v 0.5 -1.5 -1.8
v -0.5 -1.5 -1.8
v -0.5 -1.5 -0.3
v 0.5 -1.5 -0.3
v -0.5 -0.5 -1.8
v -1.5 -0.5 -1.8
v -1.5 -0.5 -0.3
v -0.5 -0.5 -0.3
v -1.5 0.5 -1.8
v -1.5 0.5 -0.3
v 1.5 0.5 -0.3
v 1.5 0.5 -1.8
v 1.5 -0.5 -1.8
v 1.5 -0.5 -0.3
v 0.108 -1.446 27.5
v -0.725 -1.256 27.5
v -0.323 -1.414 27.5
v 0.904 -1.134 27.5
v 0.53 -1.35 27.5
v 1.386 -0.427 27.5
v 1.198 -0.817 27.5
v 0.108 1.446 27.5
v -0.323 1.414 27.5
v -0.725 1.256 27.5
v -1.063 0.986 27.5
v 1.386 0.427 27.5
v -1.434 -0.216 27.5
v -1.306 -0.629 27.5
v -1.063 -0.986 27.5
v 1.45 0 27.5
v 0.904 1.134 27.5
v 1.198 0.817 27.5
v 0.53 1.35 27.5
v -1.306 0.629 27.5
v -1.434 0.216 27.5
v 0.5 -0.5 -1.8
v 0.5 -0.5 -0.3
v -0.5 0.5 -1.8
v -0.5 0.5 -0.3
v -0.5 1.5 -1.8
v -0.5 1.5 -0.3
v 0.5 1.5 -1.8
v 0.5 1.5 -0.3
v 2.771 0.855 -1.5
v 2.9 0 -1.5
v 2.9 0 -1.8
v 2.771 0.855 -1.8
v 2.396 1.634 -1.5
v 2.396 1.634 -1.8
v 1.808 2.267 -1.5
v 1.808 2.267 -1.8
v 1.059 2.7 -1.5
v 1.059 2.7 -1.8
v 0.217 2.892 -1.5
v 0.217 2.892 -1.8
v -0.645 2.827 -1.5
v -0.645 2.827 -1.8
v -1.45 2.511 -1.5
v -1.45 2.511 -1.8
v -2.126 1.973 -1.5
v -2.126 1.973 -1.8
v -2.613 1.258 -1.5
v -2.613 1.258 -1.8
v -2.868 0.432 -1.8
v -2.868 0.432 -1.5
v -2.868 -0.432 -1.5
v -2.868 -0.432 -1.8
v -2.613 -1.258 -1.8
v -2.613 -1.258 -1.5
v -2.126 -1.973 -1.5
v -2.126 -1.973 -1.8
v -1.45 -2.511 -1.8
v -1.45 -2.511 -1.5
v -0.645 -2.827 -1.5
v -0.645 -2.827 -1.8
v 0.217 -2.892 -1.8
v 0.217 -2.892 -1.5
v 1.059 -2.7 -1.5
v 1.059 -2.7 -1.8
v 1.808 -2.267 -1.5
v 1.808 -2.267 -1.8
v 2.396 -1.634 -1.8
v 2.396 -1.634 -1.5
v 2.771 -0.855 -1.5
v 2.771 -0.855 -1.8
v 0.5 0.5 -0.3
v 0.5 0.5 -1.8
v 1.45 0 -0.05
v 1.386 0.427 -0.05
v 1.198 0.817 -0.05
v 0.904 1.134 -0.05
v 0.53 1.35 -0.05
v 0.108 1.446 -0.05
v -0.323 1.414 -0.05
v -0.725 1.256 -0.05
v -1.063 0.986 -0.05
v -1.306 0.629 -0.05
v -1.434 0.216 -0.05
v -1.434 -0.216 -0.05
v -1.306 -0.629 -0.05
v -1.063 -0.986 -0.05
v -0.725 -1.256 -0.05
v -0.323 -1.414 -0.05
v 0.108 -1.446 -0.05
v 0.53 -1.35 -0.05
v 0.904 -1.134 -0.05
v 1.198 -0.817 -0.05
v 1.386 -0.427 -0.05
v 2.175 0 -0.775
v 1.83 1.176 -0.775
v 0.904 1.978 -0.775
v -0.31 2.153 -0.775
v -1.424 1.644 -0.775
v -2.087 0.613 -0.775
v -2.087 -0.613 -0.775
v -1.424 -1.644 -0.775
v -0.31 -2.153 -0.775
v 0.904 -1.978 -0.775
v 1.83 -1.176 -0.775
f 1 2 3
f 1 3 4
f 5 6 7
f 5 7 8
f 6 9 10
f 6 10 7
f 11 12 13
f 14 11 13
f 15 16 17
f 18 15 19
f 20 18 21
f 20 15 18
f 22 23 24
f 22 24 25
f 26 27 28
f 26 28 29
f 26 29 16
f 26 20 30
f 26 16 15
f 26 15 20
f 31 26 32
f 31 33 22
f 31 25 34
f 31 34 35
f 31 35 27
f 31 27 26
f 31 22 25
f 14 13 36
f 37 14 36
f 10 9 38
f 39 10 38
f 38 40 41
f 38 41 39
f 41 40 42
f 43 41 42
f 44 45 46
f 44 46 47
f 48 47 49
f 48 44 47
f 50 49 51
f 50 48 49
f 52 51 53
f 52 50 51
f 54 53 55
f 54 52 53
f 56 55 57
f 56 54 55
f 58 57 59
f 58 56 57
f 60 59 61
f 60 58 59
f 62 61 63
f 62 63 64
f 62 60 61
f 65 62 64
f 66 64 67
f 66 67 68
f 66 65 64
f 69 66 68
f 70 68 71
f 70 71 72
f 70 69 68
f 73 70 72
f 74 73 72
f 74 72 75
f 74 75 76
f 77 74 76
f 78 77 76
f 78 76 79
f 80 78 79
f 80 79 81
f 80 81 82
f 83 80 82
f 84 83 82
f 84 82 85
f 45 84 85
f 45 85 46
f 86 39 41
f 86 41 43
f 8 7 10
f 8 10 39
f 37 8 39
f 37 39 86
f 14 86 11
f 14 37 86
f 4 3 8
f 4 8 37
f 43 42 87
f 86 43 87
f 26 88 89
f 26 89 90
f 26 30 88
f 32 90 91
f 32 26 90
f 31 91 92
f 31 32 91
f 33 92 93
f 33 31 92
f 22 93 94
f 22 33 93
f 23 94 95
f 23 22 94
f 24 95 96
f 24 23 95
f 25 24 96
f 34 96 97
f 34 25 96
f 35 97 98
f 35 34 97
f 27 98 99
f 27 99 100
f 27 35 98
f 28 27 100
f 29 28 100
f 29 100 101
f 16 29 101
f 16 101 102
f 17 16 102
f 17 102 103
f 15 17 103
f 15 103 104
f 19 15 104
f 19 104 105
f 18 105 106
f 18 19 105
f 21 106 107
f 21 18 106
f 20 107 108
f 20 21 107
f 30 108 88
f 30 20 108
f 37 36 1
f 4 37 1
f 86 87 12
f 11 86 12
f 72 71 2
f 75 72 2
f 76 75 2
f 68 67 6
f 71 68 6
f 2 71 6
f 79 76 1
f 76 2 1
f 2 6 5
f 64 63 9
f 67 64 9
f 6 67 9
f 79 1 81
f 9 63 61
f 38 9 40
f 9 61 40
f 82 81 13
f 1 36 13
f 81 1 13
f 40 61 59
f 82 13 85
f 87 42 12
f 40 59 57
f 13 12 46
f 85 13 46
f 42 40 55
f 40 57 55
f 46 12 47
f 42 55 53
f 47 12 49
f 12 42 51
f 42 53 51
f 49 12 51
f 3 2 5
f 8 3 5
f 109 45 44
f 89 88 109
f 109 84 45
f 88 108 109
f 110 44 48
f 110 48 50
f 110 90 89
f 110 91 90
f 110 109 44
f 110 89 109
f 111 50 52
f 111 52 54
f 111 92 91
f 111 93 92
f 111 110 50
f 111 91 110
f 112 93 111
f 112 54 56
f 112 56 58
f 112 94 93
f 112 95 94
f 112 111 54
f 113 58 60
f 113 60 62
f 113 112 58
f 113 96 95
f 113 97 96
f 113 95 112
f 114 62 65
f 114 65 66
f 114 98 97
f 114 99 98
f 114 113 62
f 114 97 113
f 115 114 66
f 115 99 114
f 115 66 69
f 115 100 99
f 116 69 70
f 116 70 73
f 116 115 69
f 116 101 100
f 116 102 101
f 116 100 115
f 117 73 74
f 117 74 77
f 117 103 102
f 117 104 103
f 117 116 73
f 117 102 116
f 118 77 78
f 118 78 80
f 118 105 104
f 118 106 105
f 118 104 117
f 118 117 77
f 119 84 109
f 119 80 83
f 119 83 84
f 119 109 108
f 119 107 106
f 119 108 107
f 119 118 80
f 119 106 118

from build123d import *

# Parameters (mm, degrees)
F0_R        = 1.45
F1_DEPTH    = 27.5
F2_R        = 2.9
F3_DEPTH    = 1.8
F4_W        = 1
F4_H        = 1
F5_DEPTH    = 1.5
F6_S5_R     = 1.45
F6_T6_DEPTH = 6


# Not quite as in the source:
# - a fillet or chamfer that OpenCascade refuses, or shapes differently, is made with other operations: its cross-section is extruded or revolved along the edge and cut away or added


with BuildPart() as f1:
    # F0 (on Top) → F1 (new body)
    with BuildSketch(Plane.XY):
        Circle(F0_R)
    extrude(amount=F1_DEPTH)

    # F2 (on Top) → F3 (join)
    with BuildSketch(Plane.XY):
        Circle(F2_R)
    extrude(amount=-F3_DEPTH)

    # F4 (on face) → F5 (cut)
    with BuildSketch(Plane(origin=(0, 0, -1.8), x_dir=(1, 0, 0), z_dir=(0, 0, -1))):
        with Locations((1, 0)):
            Rectangle(F4_W, F4_H)
        Rectangle(F4_W, F4_H)
        with Locations((0, 1)):
            Rectangle(F4_W, F4_H)
        with Locations((-1, 0)):
            Rectangle(F4_W, F4_H)
        with Locations((0, -1)):
            Rectangle(F4_W, F4_H)
    extrude(amount=-F5_DEPTH, mode=Mode.SUBTRACT)

    # F6: chamfer of 1.5 on 1 edges, made by hand


with BuildPart() as f6_tool2:
    # F6_s3 → F6_t4 (revolve)
    with BuildSketch(Plane.XZ):
        Polygon((2.9, -1.5), (1.4, 0), (2.9, 0), align=None)
    revolve(axis=Axis((0, 0, 0), (0, 0, 1)))

    # F6_s5 → F6_t6 (cut, symmetric)
    with BuildSketch(Plane.XY.offset(-0.7)):
        Circle(F6_S5_R)
    extrude(amount=F6_T6_DEPTH, both=True, mode=Mode.SUBTRACT)


with BuildPart() as f1_1:
    add(f1.part)

    # F6_t1: cut F6_tool2
    add(f6_tool2.part, mode=Mode.SUBTRACT)


solid = f1_1.part
